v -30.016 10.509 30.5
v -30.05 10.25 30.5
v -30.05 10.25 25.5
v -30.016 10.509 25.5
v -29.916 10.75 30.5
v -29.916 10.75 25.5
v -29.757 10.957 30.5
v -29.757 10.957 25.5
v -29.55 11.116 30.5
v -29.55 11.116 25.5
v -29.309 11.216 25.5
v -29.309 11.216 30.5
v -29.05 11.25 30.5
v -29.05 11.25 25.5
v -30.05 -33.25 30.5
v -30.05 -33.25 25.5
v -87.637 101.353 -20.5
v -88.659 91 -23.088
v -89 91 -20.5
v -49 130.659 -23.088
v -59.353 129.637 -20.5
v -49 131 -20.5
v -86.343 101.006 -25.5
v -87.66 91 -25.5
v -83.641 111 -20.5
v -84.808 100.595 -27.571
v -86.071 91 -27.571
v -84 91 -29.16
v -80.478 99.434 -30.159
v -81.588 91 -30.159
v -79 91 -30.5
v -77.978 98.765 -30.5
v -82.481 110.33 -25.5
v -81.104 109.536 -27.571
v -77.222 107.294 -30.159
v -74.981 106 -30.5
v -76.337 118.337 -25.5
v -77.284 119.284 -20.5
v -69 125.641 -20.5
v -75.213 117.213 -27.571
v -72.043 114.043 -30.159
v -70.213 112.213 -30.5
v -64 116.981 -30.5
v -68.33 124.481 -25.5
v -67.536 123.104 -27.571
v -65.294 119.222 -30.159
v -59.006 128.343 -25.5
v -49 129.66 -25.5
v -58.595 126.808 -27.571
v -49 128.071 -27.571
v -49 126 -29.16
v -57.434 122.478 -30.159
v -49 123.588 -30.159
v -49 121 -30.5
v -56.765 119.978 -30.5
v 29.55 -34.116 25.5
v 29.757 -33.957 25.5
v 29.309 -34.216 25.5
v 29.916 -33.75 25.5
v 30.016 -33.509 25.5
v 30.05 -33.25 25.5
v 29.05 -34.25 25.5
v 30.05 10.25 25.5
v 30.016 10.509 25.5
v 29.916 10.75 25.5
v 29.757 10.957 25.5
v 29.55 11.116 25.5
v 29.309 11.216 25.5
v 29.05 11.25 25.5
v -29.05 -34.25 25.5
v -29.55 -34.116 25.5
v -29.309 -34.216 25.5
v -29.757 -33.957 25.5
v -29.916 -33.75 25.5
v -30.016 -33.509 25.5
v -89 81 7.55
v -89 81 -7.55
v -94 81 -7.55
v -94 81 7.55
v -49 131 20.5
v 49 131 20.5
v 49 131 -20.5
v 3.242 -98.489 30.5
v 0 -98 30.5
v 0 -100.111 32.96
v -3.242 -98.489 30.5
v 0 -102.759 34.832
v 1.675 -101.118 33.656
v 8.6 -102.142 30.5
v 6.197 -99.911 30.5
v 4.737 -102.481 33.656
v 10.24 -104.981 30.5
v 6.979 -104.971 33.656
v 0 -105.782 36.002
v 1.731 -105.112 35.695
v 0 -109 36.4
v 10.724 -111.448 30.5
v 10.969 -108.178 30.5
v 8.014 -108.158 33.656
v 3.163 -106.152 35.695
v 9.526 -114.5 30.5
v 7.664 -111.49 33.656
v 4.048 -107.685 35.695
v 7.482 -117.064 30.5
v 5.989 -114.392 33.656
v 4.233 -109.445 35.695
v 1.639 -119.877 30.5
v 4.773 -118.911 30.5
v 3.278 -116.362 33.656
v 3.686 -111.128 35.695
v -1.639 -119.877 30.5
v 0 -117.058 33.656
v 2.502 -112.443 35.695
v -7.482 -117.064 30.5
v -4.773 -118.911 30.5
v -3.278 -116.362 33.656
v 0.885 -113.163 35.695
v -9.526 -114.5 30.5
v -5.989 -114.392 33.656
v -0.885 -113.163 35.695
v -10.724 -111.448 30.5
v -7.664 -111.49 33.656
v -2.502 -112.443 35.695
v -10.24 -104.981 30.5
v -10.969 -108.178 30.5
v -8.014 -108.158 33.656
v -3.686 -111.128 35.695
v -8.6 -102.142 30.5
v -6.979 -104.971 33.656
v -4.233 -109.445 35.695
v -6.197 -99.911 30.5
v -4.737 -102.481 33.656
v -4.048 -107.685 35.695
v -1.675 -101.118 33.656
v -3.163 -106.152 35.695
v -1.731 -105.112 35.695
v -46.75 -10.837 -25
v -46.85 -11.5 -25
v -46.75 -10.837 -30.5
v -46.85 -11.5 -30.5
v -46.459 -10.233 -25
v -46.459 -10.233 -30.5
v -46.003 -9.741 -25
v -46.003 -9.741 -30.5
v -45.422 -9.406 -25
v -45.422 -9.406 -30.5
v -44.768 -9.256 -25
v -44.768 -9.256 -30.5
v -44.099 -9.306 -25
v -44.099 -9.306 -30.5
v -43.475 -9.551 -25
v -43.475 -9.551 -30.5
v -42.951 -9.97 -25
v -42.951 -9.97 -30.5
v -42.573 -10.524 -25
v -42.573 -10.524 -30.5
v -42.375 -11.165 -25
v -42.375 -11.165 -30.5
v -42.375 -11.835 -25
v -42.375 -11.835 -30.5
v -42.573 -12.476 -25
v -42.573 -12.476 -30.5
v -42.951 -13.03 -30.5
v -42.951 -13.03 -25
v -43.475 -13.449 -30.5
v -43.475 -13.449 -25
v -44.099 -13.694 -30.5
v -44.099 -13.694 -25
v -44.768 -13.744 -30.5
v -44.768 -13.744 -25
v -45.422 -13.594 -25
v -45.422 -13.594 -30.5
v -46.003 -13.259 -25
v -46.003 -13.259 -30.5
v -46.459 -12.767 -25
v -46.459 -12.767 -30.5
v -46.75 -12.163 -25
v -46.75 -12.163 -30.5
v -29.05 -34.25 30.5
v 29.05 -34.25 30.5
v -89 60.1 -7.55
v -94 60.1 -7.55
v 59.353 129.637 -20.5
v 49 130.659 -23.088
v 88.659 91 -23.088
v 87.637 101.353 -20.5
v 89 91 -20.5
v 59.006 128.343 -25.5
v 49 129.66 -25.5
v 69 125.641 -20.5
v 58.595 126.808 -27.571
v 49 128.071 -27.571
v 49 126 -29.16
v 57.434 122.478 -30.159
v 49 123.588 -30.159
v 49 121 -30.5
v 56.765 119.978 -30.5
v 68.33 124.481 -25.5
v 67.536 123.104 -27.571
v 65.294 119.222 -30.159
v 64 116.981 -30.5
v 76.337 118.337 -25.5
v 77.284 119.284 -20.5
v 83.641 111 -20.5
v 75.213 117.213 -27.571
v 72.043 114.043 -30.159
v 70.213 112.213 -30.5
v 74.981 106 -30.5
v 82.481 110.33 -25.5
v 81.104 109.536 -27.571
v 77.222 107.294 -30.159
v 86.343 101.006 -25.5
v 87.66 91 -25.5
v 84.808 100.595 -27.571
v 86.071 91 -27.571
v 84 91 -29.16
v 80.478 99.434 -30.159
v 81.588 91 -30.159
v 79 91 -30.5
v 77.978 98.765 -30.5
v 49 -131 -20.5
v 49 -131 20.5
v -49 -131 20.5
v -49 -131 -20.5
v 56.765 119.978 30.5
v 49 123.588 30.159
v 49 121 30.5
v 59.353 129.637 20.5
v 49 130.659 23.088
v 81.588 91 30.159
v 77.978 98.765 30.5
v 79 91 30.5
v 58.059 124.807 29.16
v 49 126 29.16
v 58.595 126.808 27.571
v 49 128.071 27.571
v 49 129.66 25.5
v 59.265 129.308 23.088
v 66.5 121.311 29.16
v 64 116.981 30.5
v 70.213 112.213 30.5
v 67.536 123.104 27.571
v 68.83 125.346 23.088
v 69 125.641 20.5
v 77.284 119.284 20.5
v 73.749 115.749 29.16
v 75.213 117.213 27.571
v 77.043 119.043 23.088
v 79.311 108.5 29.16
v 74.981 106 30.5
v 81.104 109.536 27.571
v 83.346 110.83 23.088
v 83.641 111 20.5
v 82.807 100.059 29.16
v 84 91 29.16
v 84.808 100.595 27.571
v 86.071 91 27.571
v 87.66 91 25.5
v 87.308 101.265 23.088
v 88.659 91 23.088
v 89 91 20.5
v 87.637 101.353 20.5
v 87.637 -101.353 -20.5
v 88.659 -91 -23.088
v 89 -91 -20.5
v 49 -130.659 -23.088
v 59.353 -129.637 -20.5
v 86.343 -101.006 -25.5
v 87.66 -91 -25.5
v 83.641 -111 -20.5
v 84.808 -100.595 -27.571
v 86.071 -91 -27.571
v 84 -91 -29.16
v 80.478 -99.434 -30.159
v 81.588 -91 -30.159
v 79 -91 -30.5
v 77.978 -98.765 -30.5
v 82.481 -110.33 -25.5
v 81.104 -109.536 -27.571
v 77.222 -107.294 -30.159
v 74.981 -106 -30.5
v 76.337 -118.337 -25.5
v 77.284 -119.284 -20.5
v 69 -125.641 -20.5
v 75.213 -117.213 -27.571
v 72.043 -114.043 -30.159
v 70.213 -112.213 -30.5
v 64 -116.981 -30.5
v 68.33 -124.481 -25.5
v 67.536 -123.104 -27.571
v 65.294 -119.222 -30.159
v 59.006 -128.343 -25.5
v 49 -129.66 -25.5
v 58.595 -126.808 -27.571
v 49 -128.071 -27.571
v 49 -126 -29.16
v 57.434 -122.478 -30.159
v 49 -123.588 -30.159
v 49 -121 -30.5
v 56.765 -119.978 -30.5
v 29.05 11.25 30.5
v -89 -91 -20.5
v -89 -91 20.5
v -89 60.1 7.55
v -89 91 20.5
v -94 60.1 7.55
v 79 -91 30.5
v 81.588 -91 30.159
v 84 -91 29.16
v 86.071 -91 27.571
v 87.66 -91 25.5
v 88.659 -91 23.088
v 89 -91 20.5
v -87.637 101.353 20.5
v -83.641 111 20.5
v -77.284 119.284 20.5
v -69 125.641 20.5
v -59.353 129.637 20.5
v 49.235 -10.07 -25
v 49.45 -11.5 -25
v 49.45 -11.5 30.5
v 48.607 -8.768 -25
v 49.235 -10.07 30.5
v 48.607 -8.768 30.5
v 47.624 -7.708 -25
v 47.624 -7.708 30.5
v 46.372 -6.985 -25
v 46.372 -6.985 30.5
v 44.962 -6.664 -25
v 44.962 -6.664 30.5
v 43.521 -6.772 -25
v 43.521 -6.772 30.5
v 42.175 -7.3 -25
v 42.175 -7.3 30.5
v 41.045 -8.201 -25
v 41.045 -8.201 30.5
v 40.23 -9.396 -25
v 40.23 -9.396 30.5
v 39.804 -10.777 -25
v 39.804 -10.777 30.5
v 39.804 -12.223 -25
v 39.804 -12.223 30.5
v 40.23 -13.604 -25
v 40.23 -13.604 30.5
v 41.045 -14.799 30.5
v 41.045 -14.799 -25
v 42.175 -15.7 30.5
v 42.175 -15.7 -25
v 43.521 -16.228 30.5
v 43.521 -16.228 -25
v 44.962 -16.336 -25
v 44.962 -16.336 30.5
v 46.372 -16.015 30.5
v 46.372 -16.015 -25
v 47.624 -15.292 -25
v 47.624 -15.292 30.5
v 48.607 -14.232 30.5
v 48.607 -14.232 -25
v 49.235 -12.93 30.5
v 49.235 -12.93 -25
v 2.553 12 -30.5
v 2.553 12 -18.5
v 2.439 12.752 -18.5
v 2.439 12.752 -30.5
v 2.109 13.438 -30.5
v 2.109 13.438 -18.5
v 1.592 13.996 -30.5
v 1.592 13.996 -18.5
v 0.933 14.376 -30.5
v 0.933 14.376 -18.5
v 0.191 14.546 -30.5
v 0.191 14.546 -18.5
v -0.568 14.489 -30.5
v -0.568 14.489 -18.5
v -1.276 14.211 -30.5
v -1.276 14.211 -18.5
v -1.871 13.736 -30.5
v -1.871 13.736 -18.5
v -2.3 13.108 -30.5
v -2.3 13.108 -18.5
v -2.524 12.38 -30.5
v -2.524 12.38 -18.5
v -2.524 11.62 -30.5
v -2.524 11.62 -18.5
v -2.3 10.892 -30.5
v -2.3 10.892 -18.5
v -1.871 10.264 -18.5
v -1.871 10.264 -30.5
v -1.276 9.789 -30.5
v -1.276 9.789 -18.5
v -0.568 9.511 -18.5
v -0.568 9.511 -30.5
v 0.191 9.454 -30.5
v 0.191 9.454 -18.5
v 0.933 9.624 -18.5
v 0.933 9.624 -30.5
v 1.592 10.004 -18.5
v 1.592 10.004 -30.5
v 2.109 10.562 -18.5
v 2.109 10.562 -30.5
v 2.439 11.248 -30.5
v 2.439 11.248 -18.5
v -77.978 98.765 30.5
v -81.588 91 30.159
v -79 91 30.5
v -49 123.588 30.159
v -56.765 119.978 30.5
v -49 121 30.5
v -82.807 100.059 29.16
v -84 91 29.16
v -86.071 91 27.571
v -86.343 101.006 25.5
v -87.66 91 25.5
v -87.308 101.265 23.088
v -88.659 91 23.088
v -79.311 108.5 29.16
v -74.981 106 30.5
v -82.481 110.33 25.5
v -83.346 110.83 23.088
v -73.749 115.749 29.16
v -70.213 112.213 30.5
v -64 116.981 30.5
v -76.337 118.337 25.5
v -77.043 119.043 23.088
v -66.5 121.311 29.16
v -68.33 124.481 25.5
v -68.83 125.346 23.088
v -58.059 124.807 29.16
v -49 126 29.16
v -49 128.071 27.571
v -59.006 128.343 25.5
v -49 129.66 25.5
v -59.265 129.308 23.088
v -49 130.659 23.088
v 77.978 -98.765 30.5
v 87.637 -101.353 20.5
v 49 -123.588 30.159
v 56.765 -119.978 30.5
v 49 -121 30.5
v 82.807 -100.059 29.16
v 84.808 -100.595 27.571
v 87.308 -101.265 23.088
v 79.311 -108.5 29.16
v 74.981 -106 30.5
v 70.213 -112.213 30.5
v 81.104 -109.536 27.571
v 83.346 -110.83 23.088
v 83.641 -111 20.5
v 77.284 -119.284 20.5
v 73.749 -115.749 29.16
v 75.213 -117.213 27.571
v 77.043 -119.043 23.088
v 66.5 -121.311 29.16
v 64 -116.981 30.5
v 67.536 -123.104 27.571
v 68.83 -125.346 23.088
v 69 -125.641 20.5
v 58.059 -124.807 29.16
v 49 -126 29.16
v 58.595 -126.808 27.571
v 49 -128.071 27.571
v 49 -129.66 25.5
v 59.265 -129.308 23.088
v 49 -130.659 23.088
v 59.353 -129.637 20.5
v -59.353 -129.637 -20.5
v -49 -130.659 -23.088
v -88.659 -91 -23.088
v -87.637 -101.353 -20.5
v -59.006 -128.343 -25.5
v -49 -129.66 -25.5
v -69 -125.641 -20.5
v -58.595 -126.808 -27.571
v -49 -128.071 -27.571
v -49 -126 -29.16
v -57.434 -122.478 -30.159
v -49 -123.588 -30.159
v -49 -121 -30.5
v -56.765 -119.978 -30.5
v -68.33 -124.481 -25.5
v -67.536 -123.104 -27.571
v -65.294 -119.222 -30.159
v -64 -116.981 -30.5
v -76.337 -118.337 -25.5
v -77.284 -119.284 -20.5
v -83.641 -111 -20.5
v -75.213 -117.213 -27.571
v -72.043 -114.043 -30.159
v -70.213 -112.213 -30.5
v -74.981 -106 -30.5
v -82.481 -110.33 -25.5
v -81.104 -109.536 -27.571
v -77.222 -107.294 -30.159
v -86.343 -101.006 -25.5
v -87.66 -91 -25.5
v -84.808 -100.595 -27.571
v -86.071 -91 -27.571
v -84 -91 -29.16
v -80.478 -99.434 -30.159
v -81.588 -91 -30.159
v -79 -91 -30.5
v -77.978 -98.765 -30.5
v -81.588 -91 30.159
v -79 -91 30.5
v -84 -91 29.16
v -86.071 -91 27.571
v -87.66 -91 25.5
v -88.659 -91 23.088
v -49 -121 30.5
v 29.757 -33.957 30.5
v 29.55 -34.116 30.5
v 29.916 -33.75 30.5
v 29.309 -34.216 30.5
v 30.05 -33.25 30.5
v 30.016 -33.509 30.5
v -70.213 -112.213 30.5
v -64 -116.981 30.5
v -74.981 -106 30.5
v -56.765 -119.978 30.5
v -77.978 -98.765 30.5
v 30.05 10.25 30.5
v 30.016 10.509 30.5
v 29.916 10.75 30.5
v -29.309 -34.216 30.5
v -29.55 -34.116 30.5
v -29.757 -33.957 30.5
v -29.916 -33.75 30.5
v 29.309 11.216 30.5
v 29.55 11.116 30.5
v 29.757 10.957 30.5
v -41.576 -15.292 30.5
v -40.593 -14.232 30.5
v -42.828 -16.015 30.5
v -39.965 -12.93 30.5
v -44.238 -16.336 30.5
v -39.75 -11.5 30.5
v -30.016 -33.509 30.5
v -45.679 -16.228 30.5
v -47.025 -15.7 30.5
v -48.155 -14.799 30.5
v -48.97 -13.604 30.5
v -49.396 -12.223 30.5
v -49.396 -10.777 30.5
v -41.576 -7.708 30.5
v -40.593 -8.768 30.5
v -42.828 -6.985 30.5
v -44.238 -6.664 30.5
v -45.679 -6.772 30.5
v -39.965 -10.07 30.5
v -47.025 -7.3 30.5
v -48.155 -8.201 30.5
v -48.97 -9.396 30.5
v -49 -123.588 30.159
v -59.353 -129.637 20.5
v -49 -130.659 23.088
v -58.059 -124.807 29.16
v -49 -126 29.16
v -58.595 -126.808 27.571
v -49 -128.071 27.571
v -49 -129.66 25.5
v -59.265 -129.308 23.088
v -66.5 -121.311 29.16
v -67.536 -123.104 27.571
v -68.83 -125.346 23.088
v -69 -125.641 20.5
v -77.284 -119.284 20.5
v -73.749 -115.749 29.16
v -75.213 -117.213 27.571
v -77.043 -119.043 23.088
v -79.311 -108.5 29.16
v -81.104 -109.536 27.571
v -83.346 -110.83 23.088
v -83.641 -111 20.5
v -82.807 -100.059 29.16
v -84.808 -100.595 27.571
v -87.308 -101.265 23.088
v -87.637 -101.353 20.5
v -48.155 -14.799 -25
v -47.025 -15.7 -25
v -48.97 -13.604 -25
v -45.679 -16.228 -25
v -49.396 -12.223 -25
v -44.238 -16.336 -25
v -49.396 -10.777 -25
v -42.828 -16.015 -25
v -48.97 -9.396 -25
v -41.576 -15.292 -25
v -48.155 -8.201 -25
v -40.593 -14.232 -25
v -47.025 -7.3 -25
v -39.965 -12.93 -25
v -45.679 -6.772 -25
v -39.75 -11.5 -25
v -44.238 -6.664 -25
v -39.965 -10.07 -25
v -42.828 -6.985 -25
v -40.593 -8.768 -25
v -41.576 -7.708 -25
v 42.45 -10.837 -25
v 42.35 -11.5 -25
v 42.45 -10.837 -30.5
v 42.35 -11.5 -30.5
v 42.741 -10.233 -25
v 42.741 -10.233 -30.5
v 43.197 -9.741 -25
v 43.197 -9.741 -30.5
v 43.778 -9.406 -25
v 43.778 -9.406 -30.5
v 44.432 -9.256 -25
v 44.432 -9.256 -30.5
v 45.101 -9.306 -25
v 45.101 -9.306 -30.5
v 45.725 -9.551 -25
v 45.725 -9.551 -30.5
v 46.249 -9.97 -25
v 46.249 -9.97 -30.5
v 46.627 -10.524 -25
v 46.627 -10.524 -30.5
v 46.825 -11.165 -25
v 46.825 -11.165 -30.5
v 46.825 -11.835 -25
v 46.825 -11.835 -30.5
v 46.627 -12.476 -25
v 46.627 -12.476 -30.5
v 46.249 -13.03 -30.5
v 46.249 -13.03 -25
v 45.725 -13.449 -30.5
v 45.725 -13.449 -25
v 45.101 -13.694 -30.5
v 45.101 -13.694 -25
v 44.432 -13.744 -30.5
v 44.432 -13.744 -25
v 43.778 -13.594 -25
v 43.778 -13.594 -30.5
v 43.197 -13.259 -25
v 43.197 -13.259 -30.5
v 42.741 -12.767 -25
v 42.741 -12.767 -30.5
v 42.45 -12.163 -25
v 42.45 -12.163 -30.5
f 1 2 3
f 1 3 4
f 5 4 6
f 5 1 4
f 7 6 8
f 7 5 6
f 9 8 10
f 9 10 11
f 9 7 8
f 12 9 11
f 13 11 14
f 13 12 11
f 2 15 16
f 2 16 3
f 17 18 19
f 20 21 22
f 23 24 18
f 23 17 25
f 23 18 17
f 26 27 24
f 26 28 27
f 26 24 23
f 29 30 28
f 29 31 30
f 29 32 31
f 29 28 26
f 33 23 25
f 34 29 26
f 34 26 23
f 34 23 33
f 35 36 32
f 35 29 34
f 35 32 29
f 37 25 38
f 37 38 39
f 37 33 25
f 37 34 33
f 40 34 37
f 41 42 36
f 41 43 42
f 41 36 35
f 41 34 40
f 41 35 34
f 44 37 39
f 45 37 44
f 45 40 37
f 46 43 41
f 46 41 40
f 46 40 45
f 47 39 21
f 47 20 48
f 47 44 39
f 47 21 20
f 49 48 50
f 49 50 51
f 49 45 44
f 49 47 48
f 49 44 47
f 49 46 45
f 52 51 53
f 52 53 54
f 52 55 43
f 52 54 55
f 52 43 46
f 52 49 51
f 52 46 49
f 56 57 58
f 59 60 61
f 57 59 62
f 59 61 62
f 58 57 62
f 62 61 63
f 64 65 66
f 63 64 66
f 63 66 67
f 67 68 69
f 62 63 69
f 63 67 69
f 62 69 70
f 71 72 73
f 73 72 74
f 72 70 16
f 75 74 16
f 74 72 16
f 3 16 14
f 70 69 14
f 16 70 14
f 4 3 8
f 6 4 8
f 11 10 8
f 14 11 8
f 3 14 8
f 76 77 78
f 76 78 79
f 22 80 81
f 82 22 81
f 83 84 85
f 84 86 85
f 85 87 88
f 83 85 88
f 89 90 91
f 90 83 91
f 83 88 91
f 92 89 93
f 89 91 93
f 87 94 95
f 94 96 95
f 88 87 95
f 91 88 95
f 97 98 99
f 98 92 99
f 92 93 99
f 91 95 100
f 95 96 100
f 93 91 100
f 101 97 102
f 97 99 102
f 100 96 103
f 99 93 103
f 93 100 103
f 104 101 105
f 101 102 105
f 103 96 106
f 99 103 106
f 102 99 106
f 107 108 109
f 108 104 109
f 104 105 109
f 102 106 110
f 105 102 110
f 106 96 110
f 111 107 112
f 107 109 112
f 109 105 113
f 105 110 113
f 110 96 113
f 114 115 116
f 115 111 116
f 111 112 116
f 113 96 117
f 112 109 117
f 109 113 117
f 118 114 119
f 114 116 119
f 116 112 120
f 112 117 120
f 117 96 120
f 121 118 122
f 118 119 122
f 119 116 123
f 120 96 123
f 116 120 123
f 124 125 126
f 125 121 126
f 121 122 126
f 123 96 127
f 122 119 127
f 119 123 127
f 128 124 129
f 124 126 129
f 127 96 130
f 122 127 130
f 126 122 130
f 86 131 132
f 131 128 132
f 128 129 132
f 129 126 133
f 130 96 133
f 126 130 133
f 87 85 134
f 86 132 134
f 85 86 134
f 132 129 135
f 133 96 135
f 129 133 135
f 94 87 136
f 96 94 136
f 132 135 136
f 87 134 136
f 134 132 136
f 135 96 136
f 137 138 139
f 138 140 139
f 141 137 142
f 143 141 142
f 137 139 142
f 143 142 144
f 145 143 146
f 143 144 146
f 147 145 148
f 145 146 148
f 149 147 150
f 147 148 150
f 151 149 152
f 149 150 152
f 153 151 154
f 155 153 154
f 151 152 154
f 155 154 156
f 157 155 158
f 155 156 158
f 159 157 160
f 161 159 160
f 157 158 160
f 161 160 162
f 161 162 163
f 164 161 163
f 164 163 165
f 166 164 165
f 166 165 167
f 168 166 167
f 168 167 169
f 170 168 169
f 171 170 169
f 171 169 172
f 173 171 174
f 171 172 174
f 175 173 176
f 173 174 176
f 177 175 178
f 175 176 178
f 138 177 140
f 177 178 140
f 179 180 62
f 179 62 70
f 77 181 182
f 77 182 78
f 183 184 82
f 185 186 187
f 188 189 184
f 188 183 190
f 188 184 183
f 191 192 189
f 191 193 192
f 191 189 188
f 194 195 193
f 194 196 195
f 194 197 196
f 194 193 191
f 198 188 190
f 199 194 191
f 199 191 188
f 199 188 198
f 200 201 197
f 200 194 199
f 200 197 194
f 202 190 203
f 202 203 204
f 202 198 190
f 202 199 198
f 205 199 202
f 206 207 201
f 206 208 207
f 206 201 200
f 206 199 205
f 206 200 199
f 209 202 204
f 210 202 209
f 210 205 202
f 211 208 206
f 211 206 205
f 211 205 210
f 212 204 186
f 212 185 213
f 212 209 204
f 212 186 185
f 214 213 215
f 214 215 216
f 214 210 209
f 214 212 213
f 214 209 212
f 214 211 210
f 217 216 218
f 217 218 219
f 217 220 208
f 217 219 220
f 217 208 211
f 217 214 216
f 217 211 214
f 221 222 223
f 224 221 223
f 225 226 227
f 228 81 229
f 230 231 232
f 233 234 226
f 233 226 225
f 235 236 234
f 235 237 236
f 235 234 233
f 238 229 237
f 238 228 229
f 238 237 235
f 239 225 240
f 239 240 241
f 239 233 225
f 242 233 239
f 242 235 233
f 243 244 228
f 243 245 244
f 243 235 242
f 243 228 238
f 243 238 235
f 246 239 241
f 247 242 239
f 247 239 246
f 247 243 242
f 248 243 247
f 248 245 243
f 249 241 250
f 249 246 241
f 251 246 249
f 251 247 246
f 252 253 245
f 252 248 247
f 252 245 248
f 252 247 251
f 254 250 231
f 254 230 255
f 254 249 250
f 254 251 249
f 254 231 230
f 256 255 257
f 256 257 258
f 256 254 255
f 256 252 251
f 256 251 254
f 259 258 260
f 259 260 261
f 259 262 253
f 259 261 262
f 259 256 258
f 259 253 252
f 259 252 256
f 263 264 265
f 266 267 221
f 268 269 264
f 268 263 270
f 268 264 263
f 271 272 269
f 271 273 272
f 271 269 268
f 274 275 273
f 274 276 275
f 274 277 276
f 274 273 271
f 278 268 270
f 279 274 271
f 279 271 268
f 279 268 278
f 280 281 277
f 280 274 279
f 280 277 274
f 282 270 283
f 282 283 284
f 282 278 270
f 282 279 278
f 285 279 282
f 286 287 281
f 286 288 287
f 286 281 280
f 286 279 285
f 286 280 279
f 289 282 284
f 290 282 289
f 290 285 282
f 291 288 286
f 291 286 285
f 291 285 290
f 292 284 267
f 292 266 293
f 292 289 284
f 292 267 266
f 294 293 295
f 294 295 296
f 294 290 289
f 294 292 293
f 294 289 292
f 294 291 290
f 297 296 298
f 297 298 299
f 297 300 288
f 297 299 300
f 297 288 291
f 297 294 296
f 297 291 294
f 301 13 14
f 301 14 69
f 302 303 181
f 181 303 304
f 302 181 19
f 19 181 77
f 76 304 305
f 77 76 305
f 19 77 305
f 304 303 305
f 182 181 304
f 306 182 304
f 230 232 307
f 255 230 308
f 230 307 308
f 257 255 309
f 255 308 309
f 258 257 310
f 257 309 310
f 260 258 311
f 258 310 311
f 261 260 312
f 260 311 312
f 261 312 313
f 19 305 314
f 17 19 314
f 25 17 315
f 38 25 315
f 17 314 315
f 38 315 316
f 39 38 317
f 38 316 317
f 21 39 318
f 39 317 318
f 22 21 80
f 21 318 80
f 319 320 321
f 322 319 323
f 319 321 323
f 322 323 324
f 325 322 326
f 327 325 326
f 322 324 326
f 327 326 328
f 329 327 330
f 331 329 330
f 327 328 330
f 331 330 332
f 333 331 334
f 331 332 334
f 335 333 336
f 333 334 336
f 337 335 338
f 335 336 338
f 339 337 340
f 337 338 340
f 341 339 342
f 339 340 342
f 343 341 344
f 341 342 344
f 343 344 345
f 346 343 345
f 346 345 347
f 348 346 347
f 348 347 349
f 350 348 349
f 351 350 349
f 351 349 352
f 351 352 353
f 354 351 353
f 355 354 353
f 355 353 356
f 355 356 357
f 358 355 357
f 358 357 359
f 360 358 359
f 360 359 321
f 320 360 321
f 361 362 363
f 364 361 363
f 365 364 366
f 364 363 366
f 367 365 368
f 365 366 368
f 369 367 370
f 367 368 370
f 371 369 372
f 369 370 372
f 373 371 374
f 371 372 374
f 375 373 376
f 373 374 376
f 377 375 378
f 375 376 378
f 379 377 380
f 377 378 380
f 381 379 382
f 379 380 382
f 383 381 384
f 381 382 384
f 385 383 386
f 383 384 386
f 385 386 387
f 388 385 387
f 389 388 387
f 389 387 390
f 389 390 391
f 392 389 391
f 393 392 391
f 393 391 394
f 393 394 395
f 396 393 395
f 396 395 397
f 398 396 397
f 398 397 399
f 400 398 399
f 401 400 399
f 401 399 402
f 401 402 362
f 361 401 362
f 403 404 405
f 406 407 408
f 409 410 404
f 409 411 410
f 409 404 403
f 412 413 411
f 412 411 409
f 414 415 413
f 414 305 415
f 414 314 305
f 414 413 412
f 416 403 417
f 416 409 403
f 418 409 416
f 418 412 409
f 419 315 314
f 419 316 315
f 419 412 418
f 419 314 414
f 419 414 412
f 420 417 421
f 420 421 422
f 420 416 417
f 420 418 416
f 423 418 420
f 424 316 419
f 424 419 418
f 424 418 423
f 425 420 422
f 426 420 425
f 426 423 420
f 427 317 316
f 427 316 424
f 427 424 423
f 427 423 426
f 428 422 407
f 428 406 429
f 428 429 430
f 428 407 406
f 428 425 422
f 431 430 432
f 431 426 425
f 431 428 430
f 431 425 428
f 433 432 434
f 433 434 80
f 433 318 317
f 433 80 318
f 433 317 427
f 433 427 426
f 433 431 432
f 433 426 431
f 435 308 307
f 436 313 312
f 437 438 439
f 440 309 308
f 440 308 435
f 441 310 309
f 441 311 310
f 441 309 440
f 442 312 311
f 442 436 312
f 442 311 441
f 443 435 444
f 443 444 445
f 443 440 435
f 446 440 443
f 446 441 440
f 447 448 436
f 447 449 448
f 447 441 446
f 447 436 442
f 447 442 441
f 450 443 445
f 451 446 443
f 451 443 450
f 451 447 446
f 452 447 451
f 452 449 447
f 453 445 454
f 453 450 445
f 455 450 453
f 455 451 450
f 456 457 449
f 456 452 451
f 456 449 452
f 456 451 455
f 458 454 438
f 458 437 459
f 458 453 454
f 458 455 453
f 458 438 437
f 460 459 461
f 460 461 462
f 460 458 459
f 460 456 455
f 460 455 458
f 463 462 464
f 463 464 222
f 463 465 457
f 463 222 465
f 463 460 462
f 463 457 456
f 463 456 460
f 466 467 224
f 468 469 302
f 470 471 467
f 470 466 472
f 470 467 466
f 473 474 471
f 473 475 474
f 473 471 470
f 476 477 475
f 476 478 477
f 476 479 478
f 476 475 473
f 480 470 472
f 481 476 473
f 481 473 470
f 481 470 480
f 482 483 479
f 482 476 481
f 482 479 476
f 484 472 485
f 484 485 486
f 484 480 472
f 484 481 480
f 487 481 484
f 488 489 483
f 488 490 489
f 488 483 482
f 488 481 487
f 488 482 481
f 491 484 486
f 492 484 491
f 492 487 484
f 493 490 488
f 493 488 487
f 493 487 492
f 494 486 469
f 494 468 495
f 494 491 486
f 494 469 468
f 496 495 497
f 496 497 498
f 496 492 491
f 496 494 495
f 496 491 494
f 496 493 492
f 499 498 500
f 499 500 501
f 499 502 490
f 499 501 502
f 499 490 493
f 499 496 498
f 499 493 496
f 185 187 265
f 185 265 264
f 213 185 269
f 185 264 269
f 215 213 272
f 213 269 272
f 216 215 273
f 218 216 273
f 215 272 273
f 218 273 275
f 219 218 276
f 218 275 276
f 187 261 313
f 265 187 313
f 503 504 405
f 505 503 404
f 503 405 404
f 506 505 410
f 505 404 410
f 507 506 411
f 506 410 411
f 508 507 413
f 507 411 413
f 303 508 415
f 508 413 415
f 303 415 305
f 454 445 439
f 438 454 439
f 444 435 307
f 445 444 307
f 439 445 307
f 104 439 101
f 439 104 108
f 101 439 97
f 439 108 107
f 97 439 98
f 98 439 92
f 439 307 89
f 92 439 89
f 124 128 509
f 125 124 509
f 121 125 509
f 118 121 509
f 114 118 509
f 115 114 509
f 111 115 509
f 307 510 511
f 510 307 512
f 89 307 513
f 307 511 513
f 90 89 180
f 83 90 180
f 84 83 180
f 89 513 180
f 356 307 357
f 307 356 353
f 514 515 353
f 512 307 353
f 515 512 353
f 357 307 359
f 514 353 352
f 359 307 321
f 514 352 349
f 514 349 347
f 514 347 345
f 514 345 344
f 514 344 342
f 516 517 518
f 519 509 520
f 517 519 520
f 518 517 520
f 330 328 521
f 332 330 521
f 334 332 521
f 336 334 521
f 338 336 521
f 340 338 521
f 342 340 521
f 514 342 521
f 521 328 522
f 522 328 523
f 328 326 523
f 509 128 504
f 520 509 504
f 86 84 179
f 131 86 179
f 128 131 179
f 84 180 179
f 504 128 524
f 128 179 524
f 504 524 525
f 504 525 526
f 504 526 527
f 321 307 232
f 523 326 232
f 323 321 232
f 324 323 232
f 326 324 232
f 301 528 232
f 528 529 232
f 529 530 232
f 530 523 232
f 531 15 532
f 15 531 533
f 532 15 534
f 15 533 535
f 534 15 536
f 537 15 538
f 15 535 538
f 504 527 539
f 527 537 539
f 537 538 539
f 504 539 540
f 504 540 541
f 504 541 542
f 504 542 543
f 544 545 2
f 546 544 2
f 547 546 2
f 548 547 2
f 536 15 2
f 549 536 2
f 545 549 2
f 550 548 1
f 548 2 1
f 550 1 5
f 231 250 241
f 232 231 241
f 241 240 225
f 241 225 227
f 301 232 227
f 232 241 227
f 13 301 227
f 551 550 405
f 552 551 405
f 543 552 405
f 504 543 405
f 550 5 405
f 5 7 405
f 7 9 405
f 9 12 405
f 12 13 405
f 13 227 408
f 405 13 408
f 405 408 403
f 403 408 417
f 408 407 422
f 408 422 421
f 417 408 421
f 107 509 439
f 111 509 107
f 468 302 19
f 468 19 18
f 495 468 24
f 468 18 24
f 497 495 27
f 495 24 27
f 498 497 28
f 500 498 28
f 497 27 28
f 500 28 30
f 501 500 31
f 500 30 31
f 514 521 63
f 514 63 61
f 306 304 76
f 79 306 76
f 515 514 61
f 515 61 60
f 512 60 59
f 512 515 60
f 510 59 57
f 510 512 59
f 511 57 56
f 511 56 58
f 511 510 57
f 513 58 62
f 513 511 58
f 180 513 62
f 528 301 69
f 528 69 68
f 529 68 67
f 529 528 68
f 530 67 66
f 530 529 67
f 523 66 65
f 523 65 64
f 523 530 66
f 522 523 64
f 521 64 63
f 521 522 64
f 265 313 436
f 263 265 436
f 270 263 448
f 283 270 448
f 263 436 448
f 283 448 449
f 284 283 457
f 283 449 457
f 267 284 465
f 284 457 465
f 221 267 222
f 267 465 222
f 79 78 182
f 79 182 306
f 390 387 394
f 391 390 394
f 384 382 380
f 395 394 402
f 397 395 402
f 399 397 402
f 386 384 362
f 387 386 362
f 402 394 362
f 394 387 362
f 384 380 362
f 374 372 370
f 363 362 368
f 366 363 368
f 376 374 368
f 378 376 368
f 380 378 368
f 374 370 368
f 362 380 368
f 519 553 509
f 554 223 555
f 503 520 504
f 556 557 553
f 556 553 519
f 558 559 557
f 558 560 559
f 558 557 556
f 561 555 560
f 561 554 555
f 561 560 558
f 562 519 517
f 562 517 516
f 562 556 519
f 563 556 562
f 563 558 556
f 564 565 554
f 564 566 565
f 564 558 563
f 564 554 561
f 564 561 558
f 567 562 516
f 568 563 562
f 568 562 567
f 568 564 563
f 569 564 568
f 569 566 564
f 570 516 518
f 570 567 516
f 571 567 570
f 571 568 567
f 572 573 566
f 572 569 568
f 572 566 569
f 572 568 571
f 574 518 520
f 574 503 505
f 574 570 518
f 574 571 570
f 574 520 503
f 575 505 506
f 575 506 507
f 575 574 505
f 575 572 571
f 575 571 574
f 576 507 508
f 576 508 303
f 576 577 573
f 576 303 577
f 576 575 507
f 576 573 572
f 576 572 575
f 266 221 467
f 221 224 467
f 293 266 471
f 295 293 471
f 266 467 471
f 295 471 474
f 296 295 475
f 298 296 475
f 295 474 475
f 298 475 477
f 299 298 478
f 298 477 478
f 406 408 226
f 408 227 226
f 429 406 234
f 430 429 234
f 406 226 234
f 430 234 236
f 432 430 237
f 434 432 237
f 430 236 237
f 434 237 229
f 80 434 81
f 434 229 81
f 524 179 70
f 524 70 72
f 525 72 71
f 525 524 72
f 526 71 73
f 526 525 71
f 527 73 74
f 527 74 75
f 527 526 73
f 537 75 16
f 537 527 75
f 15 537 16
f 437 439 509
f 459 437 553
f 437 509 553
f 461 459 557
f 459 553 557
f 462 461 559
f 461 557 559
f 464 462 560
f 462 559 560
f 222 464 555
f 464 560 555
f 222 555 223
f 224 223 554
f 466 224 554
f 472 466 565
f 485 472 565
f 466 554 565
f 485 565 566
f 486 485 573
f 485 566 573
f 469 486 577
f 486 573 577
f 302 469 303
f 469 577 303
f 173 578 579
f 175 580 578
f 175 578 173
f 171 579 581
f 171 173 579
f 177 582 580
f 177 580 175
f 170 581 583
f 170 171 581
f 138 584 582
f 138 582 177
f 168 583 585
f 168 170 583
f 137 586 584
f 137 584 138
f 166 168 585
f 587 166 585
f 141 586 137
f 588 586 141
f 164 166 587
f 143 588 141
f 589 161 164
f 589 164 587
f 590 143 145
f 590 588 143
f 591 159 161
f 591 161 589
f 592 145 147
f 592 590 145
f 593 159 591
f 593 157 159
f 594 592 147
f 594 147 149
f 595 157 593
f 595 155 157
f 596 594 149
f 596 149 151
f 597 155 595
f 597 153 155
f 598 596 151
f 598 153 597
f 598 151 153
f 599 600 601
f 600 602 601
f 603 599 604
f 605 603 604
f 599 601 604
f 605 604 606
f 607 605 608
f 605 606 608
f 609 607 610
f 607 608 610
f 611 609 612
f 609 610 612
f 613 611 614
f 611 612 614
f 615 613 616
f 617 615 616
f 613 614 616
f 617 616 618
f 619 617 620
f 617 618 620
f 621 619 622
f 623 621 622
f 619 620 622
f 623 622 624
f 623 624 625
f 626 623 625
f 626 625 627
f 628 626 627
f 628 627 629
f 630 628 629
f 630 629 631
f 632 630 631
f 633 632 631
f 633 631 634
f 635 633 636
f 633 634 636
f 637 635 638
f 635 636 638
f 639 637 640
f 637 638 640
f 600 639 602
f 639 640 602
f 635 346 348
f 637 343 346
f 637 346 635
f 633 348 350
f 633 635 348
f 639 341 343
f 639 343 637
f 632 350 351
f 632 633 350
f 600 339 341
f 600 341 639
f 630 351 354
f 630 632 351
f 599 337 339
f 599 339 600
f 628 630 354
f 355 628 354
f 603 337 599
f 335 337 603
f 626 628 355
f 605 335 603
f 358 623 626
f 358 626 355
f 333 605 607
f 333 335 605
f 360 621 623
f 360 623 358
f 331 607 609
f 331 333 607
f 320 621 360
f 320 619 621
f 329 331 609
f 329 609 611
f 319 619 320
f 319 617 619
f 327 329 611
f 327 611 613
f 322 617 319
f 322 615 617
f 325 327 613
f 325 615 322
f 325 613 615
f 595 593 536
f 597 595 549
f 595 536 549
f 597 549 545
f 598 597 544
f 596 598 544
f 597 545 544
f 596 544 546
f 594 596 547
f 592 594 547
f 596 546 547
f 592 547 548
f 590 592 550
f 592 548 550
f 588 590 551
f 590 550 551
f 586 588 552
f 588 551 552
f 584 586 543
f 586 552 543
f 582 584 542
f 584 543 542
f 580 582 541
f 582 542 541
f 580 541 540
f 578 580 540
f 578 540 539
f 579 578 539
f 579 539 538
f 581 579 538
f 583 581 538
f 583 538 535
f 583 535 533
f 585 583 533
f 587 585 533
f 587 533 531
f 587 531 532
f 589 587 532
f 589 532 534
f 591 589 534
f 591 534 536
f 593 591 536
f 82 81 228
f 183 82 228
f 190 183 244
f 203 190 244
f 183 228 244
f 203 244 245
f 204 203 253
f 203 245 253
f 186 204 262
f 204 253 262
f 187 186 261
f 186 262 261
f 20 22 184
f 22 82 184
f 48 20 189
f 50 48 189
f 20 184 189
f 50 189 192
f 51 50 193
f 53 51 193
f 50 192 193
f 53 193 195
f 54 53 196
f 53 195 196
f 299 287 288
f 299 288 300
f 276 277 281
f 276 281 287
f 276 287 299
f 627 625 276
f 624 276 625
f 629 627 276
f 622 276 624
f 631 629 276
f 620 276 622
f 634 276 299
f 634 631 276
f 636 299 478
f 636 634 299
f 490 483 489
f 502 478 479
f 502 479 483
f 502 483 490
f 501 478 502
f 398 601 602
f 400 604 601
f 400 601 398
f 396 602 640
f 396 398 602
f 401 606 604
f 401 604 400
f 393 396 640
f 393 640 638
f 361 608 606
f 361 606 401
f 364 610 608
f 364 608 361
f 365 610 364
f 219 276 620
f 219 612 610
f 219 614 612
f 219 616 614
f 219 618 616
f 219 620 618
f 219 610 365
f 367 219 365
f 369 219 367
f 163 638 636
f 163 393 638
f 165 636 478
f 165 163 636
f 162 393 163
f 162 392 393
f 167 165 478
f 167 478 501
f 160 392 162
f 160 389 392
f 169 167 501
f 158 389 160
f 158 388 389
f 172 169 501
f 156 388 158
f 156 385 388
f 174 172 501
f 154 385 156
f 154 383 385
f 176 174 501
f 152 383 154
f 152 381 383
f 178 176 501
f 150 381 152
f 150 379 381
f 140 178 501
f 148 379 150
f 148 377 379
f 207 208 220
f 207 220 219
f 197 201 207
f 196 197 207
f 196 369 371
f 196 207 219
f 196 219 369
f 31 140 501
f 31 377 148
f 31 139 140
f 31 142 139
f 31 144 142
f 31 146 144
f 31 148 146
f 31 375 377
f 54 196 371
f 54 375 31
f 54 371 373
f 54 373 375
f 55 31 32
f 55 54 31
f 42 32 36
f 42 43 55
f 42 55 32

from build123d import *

# Parameters (mm, degrees)
BOSS_EXTRUDE1_DEPTH            = 30.5
CUT_EXTRUDE1_START             = 30.5
CUT_EXTRUDE1_DEPTH             = 5
CBORE_FOR_M4_SHCS1_D           = 4.5
CBORE_FOR_M4_SHCS1_CBORE_D     = 9.7
CBORE_FOR_M4_SHCS1_CBORE_DEPTH = 55.5
F_1_4_20_TAPPED_HOLE1_D        = 5.1054
F_1_4_20_TAPPED_HOLE1_DEPTH    = 12
FILLET1_R                      = 10
SKETCH8_W                      = 15.1
SKETCH8_H                      = 20.9
BOSS_EXTRUDE2_DEPTH            = 5


with BuildPart() as part:
    # Sketch1 → Boss-Extrude1 (new body, symmetric)
    with BuildSketch(Plane.XY):
        with BuildLine():
            Line((-49, 131), (49, 131))
            ThreePointArc((49, 131), (77.284271247, 119.284271247), (89, 91))
            Line((89, 91), (89, -91))
            ThreePointArc((89, -91), (77.284271247, -119.284271247), (49, -131))
            Line((49, -131), (-49, -131))
            ThreePointArc((-49, -131), (-77.284271247, -119.284271247), (-89, -91))
            Line((-89, -91), (-89, 91))
            ThreePointArc((-89, 91), (-77.284271247, 119.284271247), (-49, 131))
        make_face()
    extrude(amount=BOSS_EXTRUDE1_DEPTH, both=True)

    # Sketch1<4> → Cut-Extrude1 (cut)
    with BuildSketch(Plane.XY.offset(CUT_EXTRUDE1_START)):
        with BuildLine():
            Line((-29.05, 11.25), (29.05, 11.25))
            ThreePointArc((29.05, 11.25), (29.757106781, 10.957106781), (30.05, 10.25))
            Line((30.05, 10.25), (30.05, -33.25))
            ThreePointArc((30.05, -33.25), (29.757106781, -33.957106781), (29.05, -34.25))
            Line((29.05, -34.25), (-29.05, -34.25))
            ThreePointArc((-29.05, -34.25), (-29.757106781, -33.957106781), (-30.05, -33.25))
            Line((-30.05, -33.25), (-30.05, 10.25))
            ThreePointArc((-30.05, 10.25), (-29.757106781, 10.957106781), (-29.05, 11.25))
        make_face()
    extrude(amount=-CUT_EXTRUDE1_DEPTH, mode=Mode.SUBTRACT)

    # CBORE for M4 SHCS1 (through all)
    with Locations(Plane.XY.offset(30.5)):
        with Locations((-44.6, -11.5), (44.6, -11.5)):
            CounterBoreHole(CBORE_FOR_M4_SHCS1_D / 2, CBORE_FOR_M4_SHCS1_CBORE_D / 2, CBORE_FOR_M4_SHCS1_CBORE_DEPTH)

    # 1/4-20 Tapped Hole1
    with Locations(Plane(origin=(0, 0, -30.5), x_dir=(-1, 0, 0), z_dir=(0, 0, -1))):
        with Locations((0, 12)):
            Hole(F_1_4_20_TAPPED_HOLE1_D / 2, depth=F_1_4_20_TAPPED_HOLE1_DEPTH)

    # Sketch4 → Revolve1 (revolve)
    with BuildSketch(Plane(origin=(0, 0, 0), x_dir=(0, 0, -1), z_dir=(1, 0, 0))):
        with BuildLine():
            Line((-36.4, -109), (-9.991525424, -109))
            ThreePointArc((-9.991525424, -109), (-23.195762712, -95.795762712), (-36.4, -109))
        make_face()
    revolve(axis=Axis((0, -109, 157.281610428), (0, 0, -1)))

    # Fillet1
    fillet1_edges = [part.edges().sort_by_distance(p)[0] for p in [
        (77.284271247, 119.284271247, -30.5),
        (0, 131, 30.5),
        (89, 0, -30.5),
        (77.284271247, -119.284271247, -30.5),
        (0, -131, -30.5),
        (-77.284271247, -119.284271247, -30.5),
        (-89, 0, -30.5),
        (-77.284271247, 119.284271247, -30.5),
        (0, 131, -30.5),
        (-77.284271247, 119.284271247, 30.5),
        (-89, 0, 30.5),
        (-77.284271247, -119.284271247, 30.5),
        (0, -131, 30.5),
        (77.284271247, -119.284271247, 30.5),
        (89, 0, 30.5),
        (77.284271247, 119.284271247, 30.5),
    ]]
    fillet(fillet1_edges, radius=FILLET1_R)

    # Sketch8 → Boss-Extrude2 (add)
    with BuildSketch(Plane.ZY.offset(89)):
        with Locations((0, 70.55)):
            Rectangle(SKETCH8_W, SKETCH8_H)
    extrude(amount=BOSS_EXTRUDE2_DEPTH)


solid = part.part
